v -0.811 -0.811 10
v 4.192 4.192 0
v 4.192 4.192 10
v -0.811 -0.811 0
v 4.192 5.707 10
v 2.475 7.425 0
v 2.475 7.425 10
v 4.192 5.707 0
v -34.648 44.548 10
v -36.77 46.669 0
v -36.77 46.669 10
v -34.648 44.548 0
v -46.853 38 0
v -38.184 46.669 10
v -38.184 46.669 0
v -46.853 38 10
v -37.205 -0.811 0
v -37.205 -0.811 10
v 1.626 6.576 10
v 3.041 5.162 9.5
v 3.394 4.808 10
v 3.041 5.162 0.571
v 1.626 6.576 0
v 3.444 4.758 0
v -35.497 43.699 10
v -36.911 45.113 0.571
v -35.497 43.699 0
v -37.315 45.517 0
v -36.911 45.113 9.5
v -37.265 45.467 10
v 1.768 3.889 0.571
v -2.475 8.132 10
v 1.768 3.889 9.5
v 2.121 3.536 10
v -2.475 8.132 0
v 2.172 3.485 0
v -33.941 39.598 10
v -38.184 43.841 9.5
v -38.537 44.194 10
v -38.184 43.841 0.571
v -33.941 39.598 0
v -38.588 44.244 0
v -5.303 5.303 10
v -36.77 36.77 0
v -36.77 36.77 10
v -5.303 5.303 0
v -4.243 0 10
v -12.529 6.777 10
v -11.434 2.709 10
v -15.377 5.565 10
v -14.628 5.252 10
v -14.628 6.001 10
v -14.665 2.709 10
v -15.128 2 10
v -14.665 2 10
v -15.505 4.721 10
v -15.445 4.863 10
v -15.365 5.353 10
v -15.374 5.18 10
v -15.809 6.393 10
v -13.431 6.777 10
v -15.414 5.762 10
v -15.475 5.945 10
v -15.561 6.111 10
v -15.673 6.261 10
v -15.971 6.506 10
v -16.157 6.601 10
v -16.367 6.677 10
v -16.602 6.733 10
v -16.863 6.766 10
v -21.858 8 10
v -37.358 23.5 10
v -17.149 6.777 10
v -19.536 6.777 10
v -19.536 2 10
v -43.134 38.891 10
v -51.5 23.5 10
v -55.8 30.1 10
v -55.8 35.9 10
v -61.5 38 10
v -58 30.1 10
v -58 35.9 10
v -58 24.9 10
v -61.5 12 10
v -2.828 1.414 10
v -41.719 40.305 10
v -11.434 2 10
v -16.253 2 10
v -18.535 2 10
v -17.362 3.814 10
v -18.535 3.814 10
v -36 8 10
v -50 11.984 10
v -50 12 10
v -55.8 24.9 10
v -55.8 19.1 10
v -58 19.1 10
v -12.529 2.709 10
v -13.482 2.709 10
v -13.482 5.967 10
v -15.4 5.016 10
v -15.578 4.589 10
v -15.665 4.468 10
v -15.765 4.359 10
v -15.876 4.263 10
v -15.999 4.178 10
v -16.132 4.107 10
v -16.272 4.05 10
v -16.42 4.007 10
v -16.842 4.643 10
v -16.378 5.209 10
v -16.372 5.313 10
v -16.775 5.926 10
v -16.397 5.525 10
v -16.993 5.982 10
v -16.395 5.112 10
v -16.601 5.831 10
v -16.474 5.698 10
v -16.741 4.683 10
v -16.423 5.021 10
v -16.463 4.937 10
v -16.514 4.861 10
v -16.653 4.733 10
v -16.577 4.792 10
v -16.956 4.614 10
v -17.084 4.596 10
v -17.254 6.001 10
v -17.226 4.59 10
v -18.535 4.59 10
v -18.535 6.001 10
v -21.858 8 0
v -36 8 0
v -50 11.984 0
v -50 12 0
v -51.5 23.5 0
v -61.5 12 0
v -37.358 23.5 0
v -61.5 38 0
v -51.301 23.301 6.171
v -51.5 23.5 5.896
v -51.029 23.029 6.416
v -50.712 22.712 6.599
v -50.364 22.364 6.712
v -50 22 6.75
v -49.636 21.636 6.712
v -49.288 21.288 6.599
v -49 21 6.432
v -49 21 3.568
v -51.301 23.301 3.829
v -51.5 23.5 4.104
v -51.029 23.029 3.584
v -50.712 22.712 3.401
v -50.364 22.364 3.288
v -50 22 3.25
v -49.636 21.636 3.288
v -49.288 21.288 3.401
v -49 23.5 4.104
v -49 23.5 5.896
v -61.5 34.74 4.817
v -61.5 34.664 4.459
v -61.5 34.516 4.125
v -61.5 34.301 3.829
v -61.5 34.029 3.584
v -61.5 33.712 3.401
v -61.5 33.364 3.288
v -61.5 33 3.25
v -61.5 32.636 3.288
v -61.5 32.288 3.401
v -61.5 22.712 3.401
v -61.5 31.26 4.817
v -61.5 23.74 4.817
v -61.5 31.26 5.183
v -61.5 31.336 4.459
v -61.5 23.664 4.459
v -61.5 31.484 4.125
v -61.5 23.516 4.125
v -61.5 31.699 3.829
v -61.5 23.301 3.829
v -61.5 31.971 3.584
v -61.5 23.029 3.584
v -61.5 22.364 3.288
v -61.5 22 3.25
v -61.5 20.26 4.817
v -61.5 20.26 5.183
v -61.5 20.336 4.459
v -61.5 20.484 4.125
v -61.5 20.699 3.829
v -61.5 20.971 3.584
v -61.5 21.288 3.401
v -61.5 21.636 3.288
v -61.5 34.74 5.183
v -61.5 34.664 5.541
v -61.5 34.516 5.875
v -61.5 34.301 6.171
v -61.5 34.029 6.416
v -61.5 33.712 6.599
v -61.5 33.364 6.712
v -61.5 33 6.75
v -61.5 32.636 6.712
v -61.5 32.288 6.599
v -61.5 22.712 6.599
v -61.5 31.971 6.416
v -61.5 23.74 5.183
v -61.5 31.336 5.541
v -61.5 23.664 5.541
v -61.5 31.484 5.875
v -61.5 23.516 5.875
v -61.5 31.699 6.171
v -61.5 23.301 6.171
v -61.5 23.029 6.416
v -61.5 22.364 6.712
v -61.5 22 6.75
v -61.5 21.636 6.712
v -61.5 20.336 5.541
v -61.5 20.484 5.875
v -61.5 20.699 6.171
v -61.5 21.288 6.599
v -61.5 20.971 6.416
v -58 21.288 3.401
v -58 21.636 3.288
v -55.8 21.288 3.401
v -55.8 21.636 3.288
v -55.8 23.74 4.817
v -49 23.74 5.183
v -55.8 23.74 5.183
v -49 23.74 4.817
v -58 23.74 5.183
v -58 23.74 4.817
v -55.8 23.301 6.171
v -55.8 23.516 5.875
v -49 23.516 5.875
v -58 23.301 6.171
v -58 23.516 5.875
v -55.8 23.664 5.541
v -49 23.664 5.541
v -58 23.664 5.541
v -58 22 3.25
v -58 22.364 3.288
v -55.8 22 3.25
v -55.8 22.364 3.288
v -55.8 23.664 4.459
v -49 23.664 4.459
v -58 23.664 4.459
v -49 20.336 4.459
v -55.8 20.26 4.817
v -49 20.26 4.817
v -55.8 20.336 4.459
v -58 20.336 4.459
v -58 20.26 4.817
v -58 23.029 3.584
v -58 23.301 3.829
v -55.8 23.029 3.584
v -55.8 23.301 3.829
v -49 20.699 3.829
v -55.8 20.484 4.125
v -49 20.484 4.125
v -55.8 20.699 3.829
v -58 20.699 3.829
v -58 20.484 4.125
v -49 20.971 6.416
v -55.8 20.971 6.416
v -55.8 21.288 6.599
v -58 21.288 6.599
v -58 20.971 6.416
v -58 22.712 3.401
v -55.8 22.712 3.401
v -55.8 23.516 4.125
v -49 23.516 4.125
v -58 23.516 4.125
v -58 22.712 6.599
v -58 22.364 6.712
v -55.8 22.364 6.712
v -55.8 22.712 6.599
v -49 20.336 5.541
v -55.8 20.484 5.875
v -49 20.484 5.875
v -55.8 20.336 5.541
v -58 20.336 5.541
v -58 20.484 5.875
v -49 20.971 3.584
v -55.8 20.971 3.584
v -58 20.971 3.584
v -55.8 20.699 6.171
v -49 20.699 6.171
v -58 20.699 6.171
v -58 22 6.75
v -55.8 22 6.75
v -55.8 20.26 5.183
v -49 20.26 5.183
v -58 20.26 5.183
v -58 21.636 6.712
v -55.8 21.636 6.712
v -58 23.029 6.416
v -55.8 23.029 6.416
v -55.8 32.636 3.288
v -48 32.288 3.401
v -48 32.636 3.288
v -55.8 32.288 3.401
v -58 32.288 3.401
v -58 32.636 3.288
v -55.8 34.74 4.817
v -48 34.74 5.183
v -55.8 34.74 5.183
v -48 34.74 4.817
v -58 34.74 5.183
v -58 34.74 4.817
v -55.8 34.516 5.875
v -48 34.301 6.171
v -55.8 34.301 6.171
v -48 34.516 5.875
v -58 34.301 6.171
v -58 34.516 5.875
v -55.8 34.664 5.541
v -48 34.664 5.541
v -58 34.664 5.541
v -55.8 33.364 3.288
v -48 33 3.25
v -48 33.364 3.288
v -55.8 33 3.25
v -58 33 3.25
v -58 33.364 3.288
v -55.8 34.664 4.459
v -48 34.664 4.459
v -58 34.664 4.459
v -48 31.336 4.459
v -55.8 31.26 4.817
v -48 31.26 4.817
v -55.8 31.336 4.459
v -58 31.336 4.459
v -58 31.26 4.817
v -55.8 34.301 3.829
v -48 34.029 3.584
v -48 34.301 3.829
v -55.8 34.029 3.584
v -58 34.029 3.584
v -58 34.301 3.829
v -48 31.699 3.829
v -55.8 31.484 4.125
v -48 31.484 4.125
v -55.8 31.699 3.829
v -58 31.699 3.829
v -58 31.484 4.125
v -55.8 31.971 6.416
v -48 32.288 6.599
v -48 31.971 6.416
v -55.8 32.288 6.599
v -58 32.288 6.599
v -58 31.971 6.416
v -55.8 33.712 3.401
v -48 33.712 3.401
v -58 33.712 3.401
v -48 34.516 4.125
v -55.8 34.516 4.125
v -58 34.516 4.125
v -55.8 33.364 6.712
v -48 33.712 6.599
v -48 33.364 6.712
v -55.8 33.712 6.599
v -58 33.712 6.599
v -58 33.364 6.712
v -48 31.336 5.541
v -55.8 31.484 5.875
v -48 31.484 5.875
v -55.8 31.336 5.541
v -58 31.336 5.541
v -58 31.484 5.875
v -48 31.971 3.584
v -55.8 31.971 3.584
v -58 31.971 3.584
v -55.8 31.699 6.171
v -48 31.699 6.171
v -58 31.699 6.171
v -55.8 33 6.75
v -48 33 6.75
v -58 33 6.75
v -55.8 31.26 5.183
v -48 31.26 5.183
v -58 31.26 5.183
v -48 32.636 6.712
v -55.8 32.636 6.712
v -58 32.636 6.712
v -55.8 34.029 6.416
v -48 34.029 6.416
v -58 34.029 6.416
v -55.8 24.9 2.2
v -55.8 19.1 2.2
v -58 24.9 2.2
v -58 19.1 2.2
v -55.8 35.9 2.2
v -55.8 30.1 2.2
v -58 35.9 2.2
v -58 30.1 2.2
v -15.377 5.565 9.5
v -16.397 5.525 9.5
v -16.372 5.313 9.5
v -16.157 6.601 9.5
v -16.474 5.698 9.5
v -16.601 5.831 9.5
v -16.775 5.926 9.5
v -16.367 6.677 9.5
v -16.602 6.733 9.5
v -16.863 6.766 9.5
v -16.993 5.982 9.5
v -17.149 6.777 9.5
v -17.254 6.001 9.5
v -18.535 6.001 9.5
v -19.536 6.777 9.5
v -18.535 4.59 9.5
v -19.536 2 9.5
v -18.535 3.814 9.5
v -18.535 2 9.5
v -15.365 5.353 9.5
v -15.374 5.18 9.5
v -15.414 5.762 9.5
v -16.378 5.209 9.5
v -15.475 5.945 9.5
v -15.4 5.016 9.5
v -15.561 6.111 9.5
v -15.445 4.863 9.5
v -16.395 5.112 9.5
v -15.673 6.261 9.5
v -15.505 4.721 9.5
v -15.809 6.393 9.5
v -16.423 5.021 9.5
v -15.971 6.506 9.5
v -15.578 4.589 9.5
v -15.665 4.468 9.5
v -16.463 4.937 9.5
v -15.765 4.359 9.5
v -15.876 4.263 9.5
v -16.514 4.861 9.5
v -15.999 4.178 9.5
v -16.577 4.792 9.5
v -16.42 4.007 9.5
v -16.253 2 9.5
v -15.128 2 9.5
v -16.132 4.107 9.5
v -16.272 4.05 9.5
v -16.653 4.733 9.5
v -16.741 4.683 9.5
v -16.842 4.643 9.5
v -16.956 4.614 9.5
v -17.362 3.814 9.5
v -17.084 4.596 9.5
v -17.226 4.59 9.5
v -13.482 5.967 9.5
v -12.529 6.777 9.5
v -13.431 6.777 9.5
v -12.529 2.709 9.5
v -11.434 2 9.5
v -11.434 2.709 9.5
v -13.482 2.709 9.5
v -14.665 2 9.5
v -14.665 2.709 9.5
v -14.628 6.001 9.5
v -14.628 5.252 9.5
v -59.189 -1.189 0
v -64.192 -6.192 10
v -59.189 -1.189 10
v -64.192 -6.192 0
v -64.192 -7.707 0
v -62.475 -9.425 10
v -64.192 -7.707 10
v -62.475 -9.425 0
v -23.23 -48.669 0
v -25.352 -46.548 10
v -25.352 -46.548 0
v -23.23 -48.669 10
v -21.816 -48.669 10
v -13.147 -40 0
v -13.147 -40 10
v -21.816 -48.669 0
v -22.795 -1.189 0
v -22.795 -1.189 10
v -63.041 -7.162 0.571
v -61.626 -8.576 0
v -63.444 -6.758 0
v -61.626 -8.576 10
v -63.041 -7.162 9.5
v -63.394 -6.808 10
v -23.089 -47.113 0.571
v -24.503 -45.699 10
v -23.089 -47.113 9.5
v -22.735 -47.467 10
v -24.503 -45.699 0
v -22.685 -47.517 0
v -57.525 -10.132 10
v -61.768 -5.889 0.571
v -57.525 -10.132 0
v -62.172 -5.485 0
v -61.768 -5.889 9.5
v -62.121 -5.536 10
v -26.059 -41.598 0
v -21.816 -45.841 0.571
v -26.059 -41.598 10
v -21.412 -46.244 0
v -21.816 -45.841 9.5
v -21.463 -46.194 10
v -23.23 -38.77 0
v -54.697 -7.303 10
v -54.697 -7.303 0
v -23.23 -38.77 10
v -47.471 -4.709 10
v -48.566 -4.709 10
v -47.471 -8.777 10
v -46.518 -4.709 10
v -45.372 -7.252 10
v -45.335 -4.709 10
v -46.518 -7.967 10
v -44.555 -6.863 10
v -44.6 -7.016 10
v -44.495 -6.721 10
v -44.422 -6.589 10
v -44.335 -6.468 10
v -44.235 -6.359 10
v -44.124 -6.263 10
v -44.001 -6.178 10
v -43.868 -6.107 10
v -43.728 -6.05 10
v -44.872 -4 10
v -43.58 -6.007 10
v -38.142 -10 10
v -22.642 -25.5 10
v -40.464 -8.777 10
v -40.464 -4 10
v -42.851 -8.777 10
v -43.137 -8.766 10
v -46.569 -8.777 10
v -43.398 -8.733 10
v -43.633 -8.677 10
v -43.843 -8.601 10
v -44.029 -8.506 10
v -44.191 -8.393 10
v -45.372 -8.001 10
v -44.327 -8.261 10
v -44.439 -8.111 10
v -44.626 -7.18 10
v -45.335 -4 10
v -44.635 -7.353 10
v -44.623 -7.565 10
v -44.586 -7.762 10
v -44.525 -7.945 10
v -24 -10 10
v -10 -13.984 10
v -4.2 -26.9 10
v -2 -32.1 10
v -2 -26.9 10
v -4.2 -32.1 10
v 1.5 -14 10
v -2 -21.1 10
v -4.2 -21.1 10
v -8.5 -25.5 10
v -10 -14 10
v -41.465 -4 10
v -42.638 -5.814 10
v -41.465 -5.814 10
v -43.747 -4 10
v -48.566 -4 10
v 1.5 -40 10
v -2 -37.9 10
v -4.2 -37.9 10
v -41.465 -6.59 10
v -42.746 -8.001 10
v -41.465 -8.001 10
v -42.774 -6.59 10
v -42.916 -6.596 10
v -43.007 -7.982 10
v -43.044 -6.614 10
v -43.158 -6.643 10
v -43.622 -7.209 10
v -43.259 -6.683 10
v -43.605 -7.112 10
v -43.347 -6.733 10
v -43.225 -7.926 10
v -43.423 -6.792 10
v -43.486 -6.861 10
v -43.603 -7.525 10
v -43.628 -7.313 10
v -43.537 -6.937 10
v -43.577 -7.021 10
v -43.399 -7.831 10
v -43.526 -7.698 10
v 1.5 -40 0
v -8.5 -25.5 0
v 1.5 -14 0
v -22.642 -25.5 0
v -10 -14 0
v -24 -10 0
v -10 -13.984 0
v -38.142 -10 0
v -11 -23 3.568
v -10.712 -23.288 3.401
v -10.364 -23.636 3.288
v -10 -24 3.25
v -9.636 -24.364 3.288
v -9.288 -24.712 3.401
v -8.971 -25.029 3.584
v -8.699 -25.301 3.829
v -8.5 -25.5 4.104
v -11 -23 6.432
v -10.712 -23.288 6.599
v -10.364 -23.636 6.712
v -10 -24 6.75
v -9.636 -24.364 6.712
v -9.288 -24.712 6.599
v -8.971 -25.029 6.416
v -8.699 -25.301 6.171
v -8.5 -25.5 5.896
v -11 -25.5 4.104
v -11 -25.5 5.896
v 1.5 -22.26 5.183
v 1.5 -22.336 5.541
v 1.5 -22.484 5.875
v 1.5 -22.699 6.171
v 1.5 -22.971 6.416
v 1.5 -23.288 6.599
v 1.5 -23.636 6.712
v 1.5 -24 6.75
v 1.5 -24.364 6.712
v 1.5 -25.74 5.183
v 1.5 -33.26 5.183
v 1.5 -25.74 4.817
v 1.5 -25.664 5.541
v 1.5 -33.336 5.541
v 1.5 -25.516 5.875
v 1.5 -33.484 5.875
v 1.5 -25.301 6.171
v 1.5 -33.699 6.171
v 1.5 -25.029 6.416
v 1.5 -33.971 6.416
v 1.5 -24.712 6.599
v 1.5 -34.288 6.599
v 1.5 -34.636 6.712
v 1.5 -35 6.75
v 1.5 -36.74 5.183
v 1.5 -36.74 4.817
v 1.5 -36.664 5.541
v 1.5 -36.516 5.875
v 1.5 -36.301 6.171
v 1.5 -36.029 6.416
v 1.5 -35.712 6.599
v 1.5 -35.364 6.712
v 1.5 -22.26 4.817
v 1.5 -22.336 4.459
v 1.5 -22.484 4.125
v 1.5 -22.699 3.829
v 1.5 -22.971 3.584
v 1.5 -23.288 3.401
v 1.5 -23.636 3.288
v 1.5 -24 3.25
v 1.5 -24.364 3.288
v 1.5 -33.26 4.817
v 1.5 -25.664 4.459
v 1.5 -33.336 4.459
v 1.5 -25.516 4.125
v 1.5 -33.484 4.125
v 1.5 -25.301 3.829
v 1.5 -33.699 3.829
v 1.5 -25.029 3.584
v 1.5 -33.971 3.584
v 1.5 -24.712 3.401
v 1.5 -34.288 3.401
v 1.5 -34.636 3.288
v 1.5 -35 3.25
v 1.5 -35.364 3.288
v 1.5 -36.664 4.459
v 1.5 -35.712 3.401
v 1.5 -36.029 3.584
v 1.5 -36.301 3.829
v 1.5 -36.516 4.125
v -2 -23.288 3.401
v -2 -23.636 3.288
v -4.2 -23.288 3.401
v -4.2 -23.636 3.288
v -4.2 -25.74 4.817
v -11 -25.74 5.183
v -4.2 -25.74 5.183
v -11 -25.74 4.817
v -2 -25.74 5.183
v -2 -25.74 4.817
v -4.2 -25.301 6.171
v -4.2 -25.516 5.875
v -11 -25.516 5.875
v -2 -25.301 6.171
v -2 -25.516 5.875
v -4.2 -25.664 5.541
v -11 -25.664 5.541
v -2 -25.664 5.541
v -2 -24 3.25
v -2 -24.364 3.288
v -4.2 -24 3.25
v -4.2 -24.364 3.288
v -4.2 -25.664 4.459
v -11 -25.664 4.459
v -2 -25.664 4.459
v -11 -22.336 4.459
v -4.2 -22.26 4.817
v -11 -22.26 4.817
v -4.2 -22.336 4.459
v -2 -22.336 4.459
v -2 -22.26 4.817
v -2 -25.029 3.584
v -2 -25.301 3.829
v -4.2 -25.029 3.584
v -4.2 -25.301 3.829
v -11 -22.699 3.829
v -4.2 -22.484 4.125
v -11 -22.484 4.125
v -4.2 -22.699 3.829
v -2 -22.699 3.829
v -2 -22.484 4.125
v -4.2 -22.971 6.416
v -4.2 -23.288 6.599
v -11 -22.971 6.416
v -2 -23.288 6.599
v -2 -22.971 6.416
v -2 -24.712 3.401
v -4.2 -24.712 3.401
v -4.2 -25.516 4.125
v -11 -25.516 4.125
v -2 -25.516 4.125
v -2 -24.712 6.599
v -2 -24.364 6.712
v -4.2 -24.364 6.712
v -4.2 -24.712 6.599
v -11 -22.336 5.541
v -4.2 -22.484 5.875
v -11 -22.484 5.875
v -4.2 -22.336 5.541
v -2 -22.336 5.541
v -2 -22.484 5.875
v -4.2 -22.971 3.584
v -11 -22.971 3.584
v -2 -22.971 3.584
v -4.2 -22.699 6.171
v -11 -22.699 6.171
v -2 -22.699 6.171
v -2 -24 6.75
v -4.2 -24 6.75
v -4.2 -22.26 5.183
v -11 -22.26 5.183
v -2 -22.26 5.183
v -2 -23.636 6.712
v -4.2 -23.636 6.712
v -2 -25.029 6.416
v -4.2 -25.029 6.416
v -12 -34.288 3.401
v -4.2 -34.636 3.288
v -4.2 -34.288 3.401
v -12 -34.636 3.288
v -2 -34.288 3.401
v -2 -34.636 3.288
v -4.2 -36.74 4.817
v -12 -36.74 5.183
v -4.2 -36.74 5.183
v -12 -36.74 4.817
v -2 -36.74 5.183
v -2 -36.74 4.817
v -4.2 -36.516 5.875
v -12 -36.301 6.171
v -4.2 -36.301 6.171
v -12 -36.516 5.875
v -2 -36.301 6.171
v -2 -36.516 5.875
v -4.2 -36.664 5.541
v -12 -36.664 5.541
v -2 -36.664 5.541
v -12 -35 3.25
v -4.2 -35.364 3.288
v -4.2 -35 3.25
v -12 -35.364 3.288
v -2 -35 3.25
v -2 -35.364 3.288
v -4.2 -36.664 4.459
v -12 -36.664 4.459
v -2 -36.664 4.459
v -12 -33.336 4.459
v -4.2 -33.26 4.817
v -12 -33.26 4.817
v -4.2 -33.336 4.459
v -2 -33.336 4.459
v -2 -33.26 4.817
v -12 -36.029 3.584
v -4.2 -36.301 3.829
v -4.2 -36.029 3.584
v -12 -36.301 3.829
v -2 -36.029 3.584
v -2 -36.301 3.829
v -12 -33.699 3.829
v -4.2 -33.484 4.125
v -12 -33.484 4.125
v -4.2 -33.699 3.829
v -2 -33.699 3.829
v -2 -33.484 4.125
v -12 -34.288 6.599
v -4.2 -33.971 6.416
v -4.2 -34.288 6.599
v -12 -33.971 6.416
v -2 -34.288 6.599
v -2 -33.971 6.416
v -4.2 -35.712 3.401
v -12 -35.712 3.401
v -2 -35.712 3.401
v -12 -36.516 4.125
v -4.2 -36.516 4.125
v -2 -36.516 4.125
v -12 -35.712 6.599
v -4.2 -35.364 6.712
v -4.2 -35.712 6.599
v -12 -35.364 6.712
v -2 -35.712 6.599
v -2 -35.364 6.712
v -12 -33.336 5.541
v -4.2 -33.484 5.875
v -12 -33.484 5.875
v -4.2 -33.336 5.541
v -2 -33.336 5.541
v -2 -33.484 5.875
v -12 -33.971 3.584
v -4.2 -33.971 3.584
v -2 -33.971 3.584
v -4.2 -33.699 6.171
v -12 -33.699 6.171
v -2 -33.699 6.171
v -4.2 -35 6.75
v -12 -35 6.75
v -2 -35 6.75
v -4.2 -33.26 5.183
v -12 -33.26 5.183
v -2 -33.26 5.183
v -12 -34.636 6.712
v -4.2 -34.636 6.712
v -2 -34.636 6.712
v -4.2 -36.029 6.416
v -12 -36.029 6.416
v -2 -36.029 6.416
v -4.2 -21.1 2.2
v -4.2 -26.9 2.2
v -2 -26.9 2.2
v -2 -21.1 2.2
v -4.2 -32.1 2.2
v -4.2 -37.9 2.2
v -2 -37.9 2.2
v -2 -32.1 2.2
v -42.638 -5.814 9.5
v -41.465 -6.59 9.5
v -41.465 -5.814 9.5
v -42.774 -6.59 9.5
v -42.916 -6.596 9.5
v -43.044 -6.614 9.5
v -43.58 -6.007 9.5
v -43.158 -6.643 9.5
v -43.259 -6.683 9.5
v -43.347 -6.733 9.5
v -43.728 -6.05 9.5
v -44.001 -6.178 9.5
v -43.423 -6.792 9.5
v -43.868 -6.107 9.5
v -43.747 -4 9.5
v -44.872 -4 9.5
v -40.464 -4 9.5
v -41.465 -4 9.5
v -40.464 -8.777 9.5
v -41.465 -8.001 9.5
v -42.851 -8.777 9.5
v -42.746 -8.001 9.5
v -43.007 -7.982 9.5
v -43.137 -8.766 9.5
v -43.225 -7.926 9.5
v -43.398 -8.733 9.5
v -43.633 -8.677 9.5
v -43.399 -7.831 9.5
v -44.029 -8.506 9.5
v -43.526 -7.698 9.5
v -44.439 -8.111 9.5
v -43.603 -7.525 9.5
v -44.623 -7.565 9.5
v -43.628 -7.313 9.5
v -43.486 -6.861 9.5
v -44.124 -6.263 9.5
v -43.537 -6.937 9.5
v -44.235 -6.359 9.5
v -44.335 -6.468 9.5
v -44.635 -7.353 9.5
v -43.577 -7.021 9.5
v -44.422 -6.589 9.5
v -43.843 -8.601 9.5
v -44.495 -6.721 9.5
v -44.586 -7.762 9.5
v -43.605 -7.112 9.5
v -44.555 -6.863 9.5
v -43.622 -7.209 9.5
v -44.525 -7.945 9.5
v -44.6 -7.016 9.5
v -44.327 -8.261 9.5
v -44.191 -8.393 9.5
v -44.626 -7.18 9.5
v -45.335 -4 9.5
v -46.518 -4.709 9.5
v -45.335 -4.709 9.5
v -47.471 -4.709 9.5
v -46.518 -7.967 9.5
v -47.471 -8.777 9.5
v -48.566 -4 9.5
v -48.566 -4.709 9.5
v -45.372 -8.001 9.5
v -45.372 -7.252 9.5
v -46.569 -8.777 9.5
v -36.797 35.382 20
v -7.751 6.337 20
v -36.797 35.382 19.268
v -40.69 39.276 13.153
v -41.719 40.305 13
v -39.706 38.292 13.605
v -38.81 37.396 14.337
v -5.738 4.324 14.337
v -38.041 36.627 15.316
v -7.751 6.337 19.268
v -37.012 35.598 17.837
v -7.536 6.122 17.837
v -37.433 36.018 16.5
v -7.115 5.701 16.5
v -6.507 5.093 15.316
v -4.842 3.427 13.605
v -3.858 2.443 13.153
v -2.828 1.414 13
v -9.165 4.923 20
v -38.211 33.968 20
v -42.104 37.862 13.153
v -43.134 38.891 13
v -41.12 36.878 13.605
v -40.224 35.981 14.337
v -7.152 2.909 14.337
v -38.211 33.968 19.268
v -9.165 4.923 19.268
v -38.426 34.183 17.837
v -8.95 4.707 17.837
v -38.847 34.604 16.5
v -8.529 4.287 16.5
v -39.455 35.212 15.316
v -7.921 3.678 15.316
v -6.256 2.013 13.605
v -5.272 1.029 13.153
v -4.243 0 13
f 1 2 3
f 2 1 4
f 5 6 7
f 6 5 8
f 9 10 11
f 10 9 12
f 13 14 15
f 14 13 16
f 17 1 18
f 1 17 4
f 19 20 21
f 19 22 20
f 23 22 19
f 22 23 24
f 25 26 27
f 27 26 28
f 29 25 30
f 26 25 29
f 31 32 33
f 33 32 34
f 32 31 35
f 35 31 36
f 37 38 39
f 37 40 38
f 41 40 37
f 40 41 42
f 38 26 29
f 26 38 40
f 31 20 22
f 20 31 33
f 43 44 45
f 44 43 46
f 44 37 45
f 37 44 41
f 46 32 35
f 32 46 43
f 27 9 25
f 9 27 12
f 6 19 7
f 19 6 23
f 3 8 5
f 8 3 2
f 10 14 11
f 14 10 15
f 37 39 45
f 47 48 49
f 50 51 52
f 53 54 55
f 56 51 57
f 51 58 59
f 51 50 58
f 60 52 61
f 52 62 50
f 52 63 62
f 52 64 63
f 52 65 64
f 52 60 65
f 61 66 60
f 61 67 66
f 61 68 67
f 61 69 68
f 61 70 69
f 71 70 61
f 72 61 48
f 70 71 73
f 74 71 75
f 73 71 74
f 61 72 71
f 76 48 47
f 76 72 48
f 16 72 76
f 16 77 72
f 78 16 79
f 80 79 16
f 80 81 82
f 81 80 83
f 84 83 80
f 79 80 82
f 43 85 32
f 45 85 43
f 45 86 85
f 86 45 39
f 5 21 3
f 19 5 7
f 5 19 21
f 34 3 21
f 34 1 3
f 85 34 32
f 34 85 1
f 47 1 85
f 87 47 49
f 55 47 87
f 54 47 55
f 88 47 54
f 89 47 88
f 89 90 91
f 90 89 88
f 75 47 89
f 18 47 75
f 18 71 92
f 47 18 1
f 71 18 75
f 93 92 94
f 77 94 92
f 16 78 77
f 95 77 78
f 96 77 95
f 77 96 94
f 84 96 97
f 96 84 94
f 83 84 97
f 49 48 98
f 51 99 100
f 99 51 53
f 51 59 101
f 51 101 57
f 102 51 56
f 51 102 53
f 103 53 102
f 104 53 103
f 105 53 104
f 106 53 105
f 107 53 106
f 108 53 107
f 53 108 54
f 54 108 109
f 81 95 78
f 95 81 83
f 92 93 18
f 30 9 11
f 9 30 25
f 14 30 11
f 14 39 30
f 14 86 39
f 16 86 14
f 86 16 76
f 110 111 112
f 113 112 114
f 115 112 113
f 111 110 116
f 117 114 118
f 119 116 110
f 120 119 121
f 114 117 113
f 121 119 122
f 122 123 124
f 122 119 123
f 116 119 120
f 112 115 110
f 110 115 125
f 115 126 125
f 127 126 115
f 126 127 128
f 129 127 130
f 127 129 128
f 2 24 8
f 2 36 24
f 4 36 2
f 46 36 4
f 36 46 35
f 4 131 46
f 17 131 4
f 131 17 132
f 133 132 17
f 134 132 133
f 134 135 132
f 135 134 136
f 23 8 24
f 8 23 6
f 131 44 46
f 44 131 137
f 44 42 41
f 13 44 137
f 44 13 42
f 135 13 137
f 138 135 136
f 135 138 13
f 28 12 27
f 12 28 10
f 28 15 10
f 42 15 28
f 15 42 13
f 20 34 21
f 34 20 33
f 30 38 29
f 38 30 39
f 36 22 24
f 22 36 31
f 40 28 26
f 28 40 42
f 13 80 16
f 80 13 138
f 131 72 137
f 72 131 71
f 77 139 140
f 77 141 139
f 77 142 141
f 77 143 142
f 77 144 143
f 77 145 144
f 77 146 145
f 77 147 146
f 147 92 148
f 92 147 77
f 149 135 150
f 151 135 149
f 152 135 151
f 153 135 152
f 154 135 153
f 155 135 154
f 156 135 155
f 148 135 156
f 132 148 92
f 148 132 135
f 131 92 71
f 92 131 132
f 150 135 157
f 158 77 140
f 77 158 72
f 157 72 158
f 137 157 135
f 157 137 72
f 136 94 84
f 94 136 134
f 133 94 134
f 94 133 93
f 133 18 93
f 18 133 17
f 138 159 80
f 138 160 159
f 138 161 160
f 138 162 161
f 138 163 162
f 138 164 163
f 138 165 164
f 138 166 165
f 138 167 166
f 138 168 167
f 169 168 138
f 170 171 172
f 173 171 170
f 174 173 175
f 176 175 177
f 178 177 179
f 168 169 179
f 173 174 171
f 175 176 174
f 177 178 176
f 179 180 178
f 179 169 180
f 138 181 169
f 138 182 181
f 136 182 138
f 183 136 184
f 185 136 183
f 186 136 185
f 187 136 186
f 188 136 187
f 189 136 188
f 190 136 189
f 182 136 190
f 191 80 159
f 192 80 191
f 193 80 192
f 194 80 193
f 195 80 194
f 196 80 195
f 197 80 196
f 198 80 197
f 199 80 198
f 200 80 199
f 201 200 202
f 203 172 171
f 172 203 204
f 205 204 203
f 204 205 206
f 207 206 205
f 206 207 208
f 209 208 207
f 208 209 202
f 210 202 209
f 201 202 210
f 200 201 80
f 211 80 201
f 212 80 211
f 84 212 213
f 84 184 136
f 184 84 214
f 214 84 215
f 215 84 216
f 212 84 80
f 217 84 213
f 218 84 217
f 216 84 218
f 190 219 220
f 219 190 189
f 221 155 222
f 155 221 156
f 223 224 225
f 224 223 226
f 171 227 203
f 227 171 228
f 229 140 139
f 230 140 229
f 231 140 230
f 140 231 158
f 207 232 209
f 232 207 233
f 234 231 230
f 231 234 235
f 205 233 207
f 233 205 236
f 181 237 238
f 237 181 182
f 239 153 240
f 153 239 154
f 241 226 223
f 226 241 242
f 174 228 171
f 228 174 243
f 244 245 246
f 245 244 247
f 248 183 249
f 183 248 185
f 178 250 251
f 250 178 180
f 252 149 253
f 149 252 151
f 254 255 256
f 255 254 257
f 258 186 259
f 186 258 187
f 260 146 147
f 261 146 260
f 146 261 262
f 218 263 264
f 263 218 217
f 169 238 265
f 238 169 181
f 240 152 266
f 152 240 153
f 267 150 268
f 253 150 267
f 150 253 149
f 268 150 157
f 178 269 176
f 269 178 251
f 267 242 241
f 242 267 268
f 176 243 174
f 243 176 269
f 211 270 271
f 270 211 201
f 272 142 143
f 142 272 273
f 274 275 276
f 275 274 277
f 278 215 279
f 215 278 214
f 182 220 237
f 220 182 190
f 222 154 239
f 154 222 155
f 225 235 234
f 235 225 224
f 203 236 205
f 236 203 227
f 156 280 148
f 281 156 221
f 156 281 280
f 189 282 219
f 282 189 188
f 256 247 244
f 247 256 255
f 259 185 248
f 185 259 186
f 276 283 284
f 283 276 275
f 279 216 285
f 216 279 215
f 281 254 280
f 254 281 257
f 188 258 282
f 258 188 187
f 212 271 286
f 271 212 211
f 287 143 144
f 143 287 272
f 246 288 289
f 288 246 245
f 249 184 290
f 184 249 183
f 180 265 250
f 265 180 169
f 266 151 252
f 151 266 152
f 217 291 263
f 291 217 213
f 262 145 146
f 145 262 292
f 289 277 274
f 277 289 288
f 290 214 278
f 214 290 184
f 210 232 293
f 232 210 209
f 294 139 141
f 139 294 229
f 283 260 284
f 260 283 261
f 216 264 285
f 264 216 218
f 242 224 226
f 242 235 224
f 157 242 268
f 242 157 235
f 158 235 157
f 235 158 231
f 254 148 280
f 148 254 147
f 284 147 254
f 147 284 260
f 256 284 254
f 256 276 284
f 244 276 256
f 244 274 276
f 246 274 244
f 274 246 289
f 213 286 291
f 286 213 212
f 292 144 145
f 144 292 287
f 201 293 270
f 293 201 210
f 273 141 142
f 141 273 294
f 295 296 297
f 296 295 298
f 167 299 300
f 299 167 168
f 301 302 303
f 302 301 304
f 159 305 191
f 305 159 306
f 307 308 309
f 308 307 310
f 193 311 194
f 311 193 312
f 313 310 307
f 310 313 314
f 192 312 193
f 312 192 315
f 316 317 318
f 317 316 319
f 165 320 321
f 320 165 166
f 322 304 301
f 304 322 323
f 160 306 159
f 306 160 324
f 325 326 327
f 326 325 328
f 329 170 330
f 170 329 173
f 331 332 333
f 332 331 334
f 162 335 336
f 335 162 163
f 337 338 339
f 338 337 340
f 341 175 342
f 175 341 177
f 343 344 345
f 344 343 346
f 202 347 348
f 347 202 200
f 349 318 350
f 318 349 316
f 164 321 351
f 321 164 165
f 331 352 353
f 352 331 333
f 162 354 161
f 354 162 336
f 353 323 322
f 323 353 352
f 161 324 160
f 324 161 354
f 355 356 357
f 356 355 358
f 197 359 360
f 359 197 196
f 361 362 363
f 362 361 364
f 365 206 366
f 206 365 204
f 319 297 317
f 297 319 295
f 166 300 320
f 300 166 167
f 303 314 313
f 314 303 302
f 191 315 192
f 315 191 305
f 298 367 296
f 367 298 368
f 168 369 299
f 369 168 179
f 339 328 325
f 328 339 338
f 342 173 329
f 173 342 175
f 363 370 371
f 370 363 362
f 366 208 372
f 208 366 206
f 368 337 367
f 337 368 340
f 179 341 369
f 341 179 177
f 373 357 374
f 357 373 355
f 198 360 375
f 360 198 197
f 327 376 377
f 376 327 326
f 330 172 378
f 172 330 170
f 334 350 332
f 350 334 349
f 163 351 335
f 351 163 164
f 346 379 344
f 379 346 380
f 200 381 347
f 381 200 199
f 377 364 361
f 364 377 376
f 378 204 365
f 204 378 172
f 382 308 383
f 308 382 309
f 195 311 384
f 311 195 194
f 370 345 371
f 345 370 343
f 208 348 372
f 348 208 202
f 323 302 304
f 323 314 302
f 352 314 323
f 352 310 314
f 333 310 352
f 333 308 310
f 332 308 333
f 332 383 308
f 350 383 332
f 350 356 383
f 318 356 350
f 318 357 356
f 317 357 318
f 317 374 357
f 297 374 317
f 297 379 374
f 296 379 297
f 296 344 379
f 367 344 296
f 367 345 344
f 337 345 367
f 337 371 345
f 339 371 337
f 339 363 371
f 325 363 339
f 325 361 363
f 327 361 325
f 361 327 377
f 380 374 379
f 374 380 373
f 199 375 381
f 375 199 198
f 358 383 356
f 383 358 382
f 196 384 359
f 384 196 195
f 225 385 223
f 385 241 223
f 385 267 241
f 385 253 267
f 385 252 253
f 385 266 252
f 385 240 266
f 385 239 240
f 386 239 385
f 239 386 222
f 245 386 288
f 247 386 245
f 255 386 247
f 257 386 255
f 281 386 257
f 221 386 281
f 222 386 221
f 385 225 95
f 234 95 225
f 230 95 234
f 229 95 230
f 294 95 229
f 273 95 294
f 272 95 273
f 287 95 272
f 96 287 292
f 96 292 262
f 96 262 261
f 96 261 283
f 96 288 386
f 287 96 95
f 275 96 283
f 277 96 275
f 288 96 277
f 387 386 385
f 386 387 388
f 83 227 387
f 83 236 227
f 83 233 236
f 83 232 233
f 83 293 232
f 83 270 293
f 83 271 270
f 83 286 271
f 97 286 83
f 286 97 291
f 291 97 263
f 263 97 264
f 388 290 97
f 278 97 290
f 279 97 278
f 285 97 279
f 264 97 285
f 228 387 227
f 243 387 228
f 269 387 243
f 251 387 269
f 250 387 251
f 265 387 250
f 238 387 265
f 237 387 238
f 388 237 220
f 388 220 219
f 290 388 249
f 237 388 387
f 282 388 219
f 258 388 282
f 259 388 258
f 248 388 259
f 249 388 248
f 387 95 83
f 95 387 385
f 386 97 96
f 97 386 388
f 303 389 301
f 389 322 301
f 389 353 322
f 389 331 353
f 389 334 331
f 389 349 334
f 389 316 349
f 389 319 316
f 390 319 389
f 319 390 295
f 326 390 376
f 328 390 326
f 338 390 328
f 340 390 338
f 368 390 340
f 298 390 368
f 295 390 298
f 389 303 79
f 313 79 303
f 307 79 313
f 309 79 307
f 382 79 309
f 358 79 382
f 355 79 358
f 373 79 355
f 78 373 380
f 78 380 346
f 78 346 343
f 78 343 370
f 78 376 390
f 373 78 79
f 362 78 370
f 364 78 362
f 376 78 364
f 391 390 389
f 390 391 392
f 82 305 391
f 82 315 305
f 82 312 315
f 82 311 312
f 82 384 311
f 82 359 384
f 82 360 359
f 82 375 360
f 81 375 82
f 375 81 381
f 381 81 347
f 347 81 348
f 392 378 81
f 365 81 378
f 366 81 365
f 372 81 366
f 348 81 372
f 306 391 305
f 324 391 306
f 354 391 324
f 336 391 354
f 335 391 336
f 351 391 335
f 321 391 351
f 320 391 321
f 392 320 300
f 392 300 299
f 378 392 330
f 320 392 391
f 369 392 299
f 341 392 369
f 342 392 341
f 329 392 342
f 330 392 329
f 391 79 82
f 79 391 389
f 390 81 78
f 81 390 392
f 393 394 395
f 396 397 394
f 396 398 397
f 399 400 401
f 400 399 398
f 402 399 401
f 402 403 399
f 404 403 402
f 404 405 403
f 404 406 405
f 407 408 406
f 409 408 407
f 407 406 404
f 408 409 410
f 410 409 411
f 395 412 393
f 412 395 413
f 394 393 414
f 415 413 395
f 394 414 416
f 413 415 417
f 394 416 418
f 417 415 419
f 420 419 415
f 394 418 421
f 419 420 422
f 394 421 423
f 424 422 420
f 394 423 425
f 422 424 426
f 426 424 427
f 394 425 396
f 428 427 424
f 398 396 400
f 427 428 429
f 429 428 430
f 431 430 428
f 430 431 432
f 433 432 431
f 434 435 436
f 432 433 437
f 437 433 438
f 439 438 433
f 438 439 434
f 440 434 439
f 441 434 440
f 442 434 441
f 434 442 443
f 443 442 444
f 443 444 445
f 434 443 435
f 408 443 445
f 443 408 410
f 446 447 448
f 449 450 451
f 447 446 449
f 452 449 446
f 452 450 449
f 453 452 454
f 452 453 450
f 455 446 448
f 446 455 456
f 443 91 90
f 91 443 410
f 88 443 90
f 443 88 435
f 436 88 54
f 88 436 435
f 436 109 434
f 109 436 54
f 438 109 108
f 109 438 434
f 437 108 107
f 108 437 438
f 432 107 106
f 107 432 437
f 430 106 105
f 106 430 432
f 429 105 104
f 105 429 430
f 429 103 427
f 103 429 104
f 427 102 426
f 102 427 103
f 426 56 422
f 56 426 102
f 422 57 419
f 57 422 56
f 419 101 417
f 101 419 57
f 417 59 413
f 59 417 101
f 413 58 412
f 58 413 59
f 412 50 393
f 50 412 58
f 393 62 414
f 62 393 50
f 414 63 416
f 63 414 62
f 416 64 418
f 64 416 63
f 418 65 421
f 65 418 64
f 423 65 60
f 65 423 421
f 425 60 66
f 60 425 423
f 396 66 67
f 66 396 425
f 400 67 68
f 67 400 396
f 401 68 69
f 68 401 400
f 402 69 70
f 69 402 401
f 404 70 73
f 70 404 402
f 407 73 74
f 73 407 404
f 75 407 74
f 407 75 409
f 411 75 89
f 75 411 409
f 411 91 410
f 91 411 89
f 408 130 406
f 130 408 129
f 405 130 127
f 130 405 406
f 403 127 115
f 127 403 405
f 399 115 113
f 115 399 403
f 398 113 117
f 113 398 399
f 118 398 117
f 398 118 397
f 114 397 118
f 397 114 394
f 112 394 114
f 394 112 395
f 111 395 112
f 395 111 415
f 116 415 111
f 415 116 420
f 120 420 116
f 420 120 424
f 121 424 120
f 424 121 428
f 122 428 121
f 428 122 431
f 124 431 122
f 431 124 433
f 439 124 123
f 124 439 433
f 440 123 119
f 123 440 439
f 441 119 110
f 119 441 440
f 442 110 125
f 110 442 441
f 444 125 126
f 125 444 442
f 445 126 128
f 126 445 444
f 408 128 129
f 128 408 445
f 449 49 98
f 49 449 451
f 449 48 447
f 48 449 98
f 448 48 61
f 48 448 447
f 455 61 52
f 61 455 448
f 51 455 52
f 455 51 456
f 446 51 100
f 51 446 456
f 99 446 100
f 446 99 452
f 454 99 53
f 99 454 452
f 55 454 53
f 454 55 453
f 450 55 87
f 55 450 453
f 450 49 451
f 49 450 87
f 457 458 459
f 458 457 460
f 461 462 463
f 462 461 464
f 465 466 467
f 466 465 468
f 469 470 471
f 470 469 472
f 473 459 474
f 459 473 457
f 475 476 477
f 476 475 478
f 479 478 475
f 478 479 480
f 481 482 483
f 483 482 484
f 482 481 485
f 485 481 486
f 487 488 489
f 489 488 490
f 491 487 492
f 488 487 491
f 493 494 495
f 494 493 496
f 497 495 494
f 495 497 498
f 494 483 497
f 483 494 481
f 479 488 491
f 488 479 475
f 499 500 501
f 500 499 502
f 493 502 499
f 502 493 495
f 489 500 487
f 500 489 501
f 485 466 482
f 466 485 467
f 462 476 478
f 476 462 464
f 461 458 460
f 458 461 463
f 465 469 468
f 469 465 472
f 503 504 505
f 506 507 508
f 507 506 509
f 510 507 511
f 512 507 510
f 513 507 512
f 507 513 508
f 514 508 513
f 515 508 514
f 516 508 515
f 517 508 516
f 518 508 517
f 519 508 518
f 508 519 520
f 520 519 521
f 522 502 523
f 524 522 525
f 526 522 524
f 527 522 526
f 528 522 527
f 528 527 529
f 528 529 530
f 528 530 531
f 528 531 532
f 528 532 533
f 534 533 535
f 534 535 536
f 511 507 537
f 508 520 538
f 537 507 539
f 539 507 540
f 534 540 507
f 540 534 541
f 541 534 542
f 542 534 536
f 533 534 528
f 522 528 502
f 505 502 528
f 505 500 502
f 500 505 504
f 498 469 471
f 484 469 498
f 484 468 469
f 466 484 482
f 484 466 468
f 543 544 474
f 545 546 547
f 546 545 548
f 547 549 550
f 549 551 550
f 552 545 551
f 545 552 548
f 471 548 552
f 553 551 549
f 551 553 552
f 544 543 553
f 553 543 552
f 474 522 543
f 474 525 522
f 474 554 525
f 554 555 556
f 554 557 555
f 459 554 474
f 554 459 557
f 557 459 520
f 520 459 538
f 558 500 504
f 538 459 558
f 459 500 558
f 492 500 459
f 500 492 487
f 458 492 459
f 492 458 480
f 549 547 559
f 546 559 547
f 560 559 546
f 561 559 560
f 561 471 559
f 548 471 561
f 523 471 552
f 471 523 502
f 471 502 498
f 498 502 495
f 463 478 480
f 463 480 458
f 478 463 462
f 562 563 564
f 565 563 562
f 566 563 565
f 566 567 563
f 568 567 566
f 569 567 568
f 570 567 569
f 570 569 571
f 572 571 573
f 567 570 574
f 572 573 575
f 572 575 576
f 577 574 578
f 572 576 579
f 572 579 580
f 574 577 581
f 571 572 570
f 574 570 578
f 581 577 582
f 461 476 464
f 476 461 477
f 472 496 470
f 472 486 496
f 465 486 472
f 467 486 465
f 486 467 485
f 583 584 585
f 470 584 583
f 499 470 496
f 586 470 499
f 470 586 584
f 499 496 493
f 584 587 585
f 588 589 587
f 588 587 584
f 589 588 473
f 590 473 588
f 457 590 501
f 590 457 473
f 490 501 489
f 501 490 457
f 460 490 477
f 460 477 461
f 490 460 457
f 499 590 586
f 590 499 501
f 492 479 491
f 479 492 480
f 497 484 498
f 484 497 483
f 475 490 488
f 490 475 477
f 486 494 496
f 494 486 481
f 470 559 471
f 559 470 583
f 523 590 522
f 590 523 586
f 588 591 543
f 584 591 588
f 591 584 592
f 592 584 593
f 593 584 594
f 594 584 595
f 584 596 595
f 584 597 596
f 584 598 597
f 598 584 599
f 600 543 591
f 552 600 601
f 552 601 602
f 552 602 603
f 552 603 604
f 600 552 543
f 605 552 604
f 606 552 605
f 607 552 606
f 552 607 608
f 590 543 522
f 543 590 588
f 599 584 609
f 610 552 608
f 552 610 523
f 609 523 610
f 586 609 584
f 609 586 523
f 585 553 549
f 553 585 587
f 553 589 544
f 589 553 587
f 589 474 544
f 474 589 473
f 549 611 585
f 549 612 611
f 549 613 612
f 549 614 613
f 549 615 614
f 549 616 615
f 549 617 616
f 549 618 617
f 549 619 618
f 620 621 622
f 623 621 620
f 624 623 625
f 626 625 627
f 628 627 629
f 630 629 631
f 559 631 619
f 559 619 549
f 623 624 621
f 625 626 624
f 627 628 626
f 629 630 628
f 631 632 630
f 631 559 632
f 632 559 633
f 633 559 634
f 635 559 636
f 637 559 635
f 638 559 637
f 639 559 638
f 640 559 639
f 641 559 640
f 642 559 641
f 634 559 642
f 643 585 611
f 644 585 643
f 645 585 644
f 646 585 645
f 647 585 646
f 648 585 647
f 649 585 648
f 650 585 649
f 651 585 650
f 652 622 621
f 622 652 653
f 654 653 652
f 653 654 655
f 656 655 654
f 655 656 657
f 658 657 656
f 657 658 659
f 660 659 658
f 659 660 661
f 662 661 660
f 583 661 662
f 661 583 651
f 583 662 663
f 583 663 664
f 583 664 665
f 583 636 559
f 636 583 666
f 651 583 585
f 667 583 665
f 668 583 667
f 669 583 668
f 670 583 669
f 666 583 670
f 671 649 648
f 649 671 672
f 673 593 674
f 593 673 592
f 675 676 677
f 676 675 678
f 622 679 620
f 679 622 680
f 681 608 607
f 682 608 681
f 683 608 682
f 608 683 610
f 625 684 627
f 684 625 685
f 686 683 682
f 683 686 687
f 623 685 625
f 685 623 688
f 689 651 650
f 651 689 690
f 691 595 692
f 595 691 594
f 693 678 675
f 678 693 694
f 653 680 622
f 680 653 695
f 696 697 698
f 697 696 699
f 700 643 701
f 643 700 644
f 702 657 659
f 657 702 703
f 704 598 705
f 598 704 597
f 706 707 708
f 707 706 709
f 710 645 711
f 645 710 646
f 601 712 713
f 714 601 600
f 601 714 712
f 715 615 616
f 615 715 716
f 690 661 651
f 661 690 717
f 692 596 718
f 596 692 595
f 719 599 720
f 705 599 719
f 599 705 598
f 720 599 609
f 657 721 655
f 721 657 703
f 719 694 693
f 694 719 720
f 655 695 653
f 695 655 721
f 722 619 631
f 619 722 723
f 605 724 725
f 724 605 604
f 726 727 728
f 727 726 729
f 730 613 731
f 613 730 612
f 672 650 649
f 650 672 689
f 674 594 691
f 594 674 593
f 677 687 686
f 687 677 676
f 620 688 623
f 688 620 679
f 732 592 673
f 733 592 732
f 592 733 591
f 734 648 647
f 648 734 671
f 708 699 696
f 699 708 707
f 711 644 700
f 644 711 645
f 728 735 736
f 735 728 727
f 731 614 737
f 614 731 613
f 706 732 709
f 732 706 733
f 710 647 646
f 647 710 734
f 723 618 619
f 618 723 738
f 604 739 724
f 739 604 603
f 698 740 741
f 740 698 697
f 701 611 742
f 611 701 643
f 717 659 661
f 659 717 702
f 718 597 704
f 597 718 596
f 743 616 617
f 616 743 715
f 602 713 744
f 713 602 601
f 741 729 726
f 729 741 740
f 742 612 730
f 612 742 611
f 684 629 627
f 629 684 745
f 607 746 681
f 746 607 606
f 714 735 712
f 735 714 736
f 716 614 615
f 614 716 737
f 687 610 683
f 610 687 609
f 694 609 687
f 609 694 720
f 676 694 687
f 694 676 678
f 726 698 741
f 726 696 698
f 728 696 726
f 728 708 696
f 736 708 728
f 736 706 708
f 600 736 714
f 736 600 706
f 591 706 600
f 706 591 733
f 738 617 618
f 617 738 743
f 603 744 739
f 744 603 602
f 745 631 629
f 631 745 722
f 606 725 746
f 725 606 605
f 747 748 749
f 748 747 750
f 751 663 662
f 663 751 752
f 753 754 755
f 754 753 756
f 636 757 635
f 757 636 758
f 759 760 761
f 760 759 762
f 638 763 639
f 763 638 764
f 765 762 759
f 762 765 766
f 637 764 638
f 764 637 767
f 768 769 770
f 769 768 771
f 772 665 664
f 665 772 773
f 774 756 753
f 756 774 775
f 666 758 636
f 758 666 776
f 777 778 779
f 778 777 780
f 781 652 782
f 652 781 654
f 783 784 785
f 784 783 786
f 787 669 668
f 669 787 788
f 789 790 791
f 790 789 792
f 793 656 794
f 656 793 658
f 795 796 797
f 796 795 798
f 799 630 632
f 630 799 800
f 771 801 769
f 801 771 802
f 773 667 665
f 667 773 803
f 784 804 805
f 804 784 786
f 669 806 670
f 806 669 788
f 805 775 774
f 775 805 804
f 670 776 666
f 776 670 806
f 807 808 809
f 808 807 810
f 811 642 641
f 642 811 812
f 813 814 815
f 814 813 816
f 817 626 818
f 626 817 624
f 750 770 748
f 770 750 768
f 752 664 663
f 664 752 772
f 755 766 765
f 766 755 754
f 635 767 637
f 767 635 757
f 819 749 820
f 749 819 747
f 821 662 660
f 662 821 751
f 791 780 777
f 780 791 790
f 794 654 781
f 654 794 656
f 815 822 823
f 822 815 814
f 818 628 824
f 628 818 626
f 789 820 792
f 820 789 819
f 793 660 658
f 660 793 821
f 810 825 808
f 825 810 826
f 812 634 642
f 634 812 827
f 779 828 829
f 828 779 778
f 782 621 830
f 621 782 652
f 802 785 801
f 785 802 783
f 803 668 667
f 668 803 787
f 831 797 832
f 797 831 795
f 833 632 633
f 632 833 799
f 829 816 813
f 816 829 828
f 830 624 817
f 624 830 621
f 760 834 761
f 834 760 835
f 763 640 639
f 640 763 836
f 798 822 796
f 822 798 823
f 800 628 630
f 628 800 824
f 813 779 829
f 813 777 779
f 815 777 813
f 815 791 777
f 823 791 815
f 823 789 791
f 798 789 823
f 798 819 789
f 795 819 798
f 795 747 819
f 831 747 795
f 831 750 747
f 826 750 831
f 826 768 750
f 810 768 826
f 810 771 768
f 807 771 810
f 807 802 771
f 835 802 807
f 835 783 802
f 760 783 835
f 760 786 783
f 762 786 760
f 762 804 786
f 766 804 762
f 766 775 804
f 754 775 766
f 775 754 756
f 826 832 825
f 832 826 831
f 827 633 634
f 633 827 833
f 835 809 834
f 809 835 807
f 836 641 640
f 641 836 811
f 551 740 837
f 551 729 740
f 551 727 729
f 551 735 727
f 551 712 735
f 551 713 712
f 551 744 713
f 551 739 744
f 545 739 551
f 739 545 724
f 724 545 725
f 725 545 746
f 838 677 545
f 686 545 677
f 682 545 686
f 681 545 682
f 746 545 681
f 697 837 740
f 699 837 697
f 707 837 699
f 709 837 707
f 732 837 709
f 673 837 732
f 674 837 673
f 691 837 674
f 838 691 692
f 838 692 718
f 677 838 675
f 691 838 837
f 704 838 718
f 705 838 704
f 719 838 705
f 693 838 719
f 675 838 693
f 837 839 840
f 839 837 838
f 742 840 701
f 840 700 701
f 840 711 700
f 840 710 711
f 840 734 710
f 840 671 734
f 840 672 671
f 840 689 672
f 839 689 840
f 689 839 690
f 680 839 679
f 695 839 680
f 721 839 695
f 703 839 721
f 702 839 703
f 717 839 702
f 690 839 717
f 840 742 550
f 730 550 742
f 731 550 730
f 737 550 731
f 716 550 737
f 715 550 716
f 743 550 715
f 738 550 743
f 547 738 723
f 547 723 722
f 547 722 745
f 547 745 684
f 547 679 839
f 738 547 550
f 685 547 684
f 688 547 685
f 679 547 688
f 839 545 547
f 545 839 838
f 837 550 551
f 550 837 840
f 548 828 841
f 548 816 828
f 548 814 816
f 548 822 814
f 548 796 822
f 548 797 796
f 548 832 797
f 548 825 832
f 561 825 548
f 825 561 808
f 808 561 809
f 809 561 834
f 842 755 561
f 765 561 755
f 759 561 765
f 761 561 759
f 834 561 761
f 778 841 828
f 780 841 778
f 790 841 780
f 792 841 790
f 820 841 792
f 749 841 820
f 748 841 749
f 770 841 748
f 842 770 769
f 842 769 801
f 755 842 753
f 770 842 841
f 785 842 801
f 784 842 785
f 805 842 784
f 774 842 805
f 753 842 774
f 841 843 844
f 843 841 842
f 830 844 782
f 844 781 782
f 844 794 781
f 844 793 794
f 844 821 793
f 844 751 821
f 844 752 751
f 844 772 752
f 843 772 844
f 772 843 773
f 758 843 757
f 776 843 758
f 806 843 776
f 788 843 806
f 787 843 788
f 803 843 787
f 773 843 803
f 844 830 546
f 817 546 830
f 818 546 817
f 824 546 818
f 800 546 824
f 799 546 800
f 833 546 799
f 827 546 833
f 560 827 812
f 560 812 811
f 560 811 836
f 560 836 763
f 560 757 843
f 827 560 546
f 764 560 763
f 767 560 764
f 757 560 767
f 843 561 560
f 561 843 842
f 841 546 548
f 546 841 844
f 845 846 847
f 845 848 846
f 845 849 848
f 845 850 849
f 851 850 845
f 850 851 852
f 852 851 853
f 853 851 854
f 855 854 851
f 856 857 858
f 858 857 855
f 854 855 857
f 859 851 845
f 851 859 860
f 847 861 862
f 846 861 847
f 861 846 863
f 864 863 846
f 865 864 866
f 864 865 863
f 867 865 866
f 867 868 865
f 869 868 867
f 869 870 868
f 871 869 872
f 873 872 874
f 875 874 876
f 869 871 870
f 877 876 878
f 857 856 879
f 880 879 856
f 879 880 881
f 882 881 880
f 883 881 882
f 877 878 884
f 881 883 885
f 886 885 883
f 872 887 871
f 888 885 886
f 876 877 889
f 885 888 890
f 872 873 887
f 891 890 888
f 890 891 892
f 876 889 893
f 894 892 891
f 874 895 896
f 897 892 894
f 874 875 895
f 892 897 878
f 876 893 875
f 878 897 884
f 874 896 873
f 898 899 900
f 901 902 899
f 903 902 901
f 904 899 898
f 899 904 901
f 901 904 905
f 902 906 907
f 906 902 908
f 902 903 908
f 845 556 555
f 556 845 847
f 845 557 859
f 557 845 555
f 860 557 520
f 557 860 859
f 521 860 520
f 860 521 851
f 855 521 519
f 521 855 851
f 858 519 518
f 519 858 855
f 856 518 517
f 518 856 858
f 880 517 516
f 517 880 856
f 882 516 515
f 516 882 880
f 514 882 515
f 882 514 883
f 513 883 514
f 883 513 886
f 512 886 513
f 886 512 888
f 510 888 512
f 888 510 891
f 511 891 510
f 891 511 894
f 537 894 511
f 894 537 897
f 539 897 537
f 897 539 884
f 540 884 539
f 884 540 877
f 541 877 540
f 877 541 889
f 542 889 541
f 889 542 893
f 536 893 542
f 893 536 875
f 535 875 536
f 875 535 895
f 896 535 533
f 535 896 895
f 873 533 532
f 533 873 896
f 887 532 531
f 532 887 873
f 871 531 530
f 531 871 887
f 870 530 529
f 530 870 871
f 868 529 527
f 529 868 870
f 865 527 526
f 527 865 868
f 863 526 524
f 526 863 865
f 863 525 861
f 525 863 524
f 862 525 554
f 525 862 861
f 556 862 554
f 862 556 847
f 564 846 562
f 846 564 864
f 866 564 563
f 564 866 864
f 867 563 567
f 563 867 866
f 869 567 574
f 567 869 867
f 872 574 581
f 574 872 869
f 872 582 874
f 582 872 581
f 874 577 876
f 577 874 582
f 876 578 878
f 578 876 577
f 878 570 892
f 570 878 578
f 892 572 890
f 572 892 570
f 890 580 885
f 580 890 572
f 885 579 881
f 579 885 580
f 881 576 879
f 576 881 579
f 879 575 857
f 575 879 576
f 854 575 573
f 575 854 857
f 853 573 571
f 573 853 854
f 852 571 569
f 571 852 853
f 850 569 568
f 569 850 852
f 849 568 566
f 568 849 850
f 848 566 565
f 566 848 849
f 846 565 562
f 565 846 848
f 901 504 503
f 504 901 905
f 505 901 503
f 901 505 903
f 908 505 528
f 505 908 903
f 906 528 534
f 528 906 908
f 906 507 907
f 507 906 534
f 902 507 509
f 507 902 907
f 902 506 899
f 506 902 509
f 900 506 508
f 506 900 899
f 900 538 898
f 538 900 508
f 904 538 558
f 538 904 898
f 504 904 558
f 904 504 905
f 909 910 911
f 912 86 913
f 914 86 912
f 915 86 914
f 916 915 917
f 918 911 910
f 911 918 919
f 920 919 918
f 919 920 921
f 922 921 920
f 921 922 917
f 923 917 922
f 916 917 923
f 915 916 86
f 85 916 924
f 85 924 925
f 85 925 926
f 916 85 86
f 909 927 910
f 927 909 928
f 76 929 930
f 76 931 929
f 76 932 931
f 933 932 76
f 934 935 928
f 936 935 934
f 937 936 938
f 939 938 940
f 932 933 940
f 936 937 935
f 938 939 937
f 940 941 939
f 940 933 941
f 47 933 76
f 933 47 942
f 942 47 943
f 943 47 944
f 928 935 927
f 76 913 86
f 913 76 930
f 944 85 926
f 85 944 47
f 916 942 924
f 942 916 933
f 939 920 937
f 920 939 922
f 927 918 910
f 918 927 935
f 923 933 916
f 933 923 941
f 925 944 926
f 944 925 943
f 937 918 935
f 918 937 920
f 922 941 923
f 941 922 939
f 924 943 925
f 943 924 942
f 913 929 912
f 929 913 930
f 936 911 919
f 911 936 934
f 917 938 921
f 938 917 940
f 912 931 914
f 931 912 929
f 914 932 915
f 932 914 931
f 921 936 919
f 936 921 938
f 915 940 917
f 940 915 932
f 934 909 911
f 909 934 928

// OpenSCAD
// PIRANHA iteration1
// LCD supports
// GNU GPL v3
// Usan Siriwardana <usiriwar@uwaterloo.ca> and contributors
// based on Prusa i3 MK3S
// https://reprap.org/wiki/Prusa_i3_MK3

module body()
{

    difference() 
        {
        // base block
        translate([-55,-2,0]) cube([69,81,10]); 

            union ()
            {
                // outer body shape
                translate([-69.6,32,-1]) rotate([0,0,45]) cube([60,53,15]); 
                translate([13.7,89.7,-1]) rotate([0,0,135]) cube([60,42,15]);
                translate([-19,-9,-1]) cube([60,9,15] );   
                translate([7,-3,-1]) cube([60,68,16]);  
                translate([-16,60,-1]) cube([60,50,15] );
                translate([-41, -45,-1]) rotate([0,0,45]) cube([60,80,13]);  
                
                // pcb cout out
                translate([4,1.5,-1]) cube([1.8,56.5,17]); 
                translate([0,7.5,-1]) cube([5.8,44.5,17]); 
                translate([4.8,3.5,-1]) cube([5.8,52.5,17]);
                translate([8,-5,-1] ) rotate([0,0,45]) cube([5,5,17]);
                translate([8,58,-1]) rotate([0,0,45]) cube([5,5,17]);
            }

            // pcb inserts
            translate([4,3,8]) rotate([45,0,0]) cube([1.8,5,5]); 
            translate([4,56.5,8]) rotate([45,0,0]) cube([1.8,5,5]);     
            translate([4,3,-5]) rotate([45,0,0]) cube([1.8,5,5]); 
            translate([4,56.5,-5]) rotate([45,0,0]) cube([1.8,5,5]);     
        }
}



module support()
{
    difference() 
    {
    
        union()
        {
            rotate([0,0,45]) body();
            // screw block
            translate([-72,22,0])  cube([30,16,10]);    
        }
        
        // lower angled part cut
        translate([-75,-2,-1])  cube([20,14,15]);    
        translate([-70,-2,-1]) cube([20,14,15]);    
        translate([-50,-16.3,-1]) rotate([0,0,45]) cube([20,20,15]);    
        
        translate([-76.5,-2,-1]) cube([15,40,15]);    
        
        difference()
        {
            translate([-28,0,-1]) rotate([0,0,45]) cube([10,40,15]);    
            translate([-38,-12,-1]) cube([20,20,15]);    
            translate([-58,23.5,-1]) cube([25,25,15]);    
        }
        
        // screw holes
        translate([-71,18+4,5]) rotate([0,90,0]) cylinder(h=22, r=1.75, $fn=30);  
        translate([-70,29+4,5]) rotate([0,90,0]) cylinder(h=22, r=1.75, $fn=30);  
        
        // nut traps
        translate([-58,15.1+4,5-2.8]) cube([2.2,5.8,29.7]);    
        translate([-58,26.1+4,5-2.8]) cube([2.2,5.8,29.7]); 
     
        // version
        translate([-20,2,9.5]) rotate([0,0,0]) linear_extrude(height = 0.6) 
        { text("R1",font = "helvetica:style=Bold", size=5); }   
    }
}


module left_lcd_support()
{
    support();
     
    rotate([0,0,45]) difference()
    {
        // sd card shield
        translate([-3,3,10])  cube([2,55,10]); 
        translate([-4,3,20]) rotate([0,90,0]) cylinder( h=4, r=7, $fn=30); 
        translate([-4,58,20]) rotate([0,90,0]) cylinder( h=4, r=7, $fn=30); 
    }
}

translate([-60,-2,0]) rotate([0,0,180]) support();
left_lcd_support();

 
